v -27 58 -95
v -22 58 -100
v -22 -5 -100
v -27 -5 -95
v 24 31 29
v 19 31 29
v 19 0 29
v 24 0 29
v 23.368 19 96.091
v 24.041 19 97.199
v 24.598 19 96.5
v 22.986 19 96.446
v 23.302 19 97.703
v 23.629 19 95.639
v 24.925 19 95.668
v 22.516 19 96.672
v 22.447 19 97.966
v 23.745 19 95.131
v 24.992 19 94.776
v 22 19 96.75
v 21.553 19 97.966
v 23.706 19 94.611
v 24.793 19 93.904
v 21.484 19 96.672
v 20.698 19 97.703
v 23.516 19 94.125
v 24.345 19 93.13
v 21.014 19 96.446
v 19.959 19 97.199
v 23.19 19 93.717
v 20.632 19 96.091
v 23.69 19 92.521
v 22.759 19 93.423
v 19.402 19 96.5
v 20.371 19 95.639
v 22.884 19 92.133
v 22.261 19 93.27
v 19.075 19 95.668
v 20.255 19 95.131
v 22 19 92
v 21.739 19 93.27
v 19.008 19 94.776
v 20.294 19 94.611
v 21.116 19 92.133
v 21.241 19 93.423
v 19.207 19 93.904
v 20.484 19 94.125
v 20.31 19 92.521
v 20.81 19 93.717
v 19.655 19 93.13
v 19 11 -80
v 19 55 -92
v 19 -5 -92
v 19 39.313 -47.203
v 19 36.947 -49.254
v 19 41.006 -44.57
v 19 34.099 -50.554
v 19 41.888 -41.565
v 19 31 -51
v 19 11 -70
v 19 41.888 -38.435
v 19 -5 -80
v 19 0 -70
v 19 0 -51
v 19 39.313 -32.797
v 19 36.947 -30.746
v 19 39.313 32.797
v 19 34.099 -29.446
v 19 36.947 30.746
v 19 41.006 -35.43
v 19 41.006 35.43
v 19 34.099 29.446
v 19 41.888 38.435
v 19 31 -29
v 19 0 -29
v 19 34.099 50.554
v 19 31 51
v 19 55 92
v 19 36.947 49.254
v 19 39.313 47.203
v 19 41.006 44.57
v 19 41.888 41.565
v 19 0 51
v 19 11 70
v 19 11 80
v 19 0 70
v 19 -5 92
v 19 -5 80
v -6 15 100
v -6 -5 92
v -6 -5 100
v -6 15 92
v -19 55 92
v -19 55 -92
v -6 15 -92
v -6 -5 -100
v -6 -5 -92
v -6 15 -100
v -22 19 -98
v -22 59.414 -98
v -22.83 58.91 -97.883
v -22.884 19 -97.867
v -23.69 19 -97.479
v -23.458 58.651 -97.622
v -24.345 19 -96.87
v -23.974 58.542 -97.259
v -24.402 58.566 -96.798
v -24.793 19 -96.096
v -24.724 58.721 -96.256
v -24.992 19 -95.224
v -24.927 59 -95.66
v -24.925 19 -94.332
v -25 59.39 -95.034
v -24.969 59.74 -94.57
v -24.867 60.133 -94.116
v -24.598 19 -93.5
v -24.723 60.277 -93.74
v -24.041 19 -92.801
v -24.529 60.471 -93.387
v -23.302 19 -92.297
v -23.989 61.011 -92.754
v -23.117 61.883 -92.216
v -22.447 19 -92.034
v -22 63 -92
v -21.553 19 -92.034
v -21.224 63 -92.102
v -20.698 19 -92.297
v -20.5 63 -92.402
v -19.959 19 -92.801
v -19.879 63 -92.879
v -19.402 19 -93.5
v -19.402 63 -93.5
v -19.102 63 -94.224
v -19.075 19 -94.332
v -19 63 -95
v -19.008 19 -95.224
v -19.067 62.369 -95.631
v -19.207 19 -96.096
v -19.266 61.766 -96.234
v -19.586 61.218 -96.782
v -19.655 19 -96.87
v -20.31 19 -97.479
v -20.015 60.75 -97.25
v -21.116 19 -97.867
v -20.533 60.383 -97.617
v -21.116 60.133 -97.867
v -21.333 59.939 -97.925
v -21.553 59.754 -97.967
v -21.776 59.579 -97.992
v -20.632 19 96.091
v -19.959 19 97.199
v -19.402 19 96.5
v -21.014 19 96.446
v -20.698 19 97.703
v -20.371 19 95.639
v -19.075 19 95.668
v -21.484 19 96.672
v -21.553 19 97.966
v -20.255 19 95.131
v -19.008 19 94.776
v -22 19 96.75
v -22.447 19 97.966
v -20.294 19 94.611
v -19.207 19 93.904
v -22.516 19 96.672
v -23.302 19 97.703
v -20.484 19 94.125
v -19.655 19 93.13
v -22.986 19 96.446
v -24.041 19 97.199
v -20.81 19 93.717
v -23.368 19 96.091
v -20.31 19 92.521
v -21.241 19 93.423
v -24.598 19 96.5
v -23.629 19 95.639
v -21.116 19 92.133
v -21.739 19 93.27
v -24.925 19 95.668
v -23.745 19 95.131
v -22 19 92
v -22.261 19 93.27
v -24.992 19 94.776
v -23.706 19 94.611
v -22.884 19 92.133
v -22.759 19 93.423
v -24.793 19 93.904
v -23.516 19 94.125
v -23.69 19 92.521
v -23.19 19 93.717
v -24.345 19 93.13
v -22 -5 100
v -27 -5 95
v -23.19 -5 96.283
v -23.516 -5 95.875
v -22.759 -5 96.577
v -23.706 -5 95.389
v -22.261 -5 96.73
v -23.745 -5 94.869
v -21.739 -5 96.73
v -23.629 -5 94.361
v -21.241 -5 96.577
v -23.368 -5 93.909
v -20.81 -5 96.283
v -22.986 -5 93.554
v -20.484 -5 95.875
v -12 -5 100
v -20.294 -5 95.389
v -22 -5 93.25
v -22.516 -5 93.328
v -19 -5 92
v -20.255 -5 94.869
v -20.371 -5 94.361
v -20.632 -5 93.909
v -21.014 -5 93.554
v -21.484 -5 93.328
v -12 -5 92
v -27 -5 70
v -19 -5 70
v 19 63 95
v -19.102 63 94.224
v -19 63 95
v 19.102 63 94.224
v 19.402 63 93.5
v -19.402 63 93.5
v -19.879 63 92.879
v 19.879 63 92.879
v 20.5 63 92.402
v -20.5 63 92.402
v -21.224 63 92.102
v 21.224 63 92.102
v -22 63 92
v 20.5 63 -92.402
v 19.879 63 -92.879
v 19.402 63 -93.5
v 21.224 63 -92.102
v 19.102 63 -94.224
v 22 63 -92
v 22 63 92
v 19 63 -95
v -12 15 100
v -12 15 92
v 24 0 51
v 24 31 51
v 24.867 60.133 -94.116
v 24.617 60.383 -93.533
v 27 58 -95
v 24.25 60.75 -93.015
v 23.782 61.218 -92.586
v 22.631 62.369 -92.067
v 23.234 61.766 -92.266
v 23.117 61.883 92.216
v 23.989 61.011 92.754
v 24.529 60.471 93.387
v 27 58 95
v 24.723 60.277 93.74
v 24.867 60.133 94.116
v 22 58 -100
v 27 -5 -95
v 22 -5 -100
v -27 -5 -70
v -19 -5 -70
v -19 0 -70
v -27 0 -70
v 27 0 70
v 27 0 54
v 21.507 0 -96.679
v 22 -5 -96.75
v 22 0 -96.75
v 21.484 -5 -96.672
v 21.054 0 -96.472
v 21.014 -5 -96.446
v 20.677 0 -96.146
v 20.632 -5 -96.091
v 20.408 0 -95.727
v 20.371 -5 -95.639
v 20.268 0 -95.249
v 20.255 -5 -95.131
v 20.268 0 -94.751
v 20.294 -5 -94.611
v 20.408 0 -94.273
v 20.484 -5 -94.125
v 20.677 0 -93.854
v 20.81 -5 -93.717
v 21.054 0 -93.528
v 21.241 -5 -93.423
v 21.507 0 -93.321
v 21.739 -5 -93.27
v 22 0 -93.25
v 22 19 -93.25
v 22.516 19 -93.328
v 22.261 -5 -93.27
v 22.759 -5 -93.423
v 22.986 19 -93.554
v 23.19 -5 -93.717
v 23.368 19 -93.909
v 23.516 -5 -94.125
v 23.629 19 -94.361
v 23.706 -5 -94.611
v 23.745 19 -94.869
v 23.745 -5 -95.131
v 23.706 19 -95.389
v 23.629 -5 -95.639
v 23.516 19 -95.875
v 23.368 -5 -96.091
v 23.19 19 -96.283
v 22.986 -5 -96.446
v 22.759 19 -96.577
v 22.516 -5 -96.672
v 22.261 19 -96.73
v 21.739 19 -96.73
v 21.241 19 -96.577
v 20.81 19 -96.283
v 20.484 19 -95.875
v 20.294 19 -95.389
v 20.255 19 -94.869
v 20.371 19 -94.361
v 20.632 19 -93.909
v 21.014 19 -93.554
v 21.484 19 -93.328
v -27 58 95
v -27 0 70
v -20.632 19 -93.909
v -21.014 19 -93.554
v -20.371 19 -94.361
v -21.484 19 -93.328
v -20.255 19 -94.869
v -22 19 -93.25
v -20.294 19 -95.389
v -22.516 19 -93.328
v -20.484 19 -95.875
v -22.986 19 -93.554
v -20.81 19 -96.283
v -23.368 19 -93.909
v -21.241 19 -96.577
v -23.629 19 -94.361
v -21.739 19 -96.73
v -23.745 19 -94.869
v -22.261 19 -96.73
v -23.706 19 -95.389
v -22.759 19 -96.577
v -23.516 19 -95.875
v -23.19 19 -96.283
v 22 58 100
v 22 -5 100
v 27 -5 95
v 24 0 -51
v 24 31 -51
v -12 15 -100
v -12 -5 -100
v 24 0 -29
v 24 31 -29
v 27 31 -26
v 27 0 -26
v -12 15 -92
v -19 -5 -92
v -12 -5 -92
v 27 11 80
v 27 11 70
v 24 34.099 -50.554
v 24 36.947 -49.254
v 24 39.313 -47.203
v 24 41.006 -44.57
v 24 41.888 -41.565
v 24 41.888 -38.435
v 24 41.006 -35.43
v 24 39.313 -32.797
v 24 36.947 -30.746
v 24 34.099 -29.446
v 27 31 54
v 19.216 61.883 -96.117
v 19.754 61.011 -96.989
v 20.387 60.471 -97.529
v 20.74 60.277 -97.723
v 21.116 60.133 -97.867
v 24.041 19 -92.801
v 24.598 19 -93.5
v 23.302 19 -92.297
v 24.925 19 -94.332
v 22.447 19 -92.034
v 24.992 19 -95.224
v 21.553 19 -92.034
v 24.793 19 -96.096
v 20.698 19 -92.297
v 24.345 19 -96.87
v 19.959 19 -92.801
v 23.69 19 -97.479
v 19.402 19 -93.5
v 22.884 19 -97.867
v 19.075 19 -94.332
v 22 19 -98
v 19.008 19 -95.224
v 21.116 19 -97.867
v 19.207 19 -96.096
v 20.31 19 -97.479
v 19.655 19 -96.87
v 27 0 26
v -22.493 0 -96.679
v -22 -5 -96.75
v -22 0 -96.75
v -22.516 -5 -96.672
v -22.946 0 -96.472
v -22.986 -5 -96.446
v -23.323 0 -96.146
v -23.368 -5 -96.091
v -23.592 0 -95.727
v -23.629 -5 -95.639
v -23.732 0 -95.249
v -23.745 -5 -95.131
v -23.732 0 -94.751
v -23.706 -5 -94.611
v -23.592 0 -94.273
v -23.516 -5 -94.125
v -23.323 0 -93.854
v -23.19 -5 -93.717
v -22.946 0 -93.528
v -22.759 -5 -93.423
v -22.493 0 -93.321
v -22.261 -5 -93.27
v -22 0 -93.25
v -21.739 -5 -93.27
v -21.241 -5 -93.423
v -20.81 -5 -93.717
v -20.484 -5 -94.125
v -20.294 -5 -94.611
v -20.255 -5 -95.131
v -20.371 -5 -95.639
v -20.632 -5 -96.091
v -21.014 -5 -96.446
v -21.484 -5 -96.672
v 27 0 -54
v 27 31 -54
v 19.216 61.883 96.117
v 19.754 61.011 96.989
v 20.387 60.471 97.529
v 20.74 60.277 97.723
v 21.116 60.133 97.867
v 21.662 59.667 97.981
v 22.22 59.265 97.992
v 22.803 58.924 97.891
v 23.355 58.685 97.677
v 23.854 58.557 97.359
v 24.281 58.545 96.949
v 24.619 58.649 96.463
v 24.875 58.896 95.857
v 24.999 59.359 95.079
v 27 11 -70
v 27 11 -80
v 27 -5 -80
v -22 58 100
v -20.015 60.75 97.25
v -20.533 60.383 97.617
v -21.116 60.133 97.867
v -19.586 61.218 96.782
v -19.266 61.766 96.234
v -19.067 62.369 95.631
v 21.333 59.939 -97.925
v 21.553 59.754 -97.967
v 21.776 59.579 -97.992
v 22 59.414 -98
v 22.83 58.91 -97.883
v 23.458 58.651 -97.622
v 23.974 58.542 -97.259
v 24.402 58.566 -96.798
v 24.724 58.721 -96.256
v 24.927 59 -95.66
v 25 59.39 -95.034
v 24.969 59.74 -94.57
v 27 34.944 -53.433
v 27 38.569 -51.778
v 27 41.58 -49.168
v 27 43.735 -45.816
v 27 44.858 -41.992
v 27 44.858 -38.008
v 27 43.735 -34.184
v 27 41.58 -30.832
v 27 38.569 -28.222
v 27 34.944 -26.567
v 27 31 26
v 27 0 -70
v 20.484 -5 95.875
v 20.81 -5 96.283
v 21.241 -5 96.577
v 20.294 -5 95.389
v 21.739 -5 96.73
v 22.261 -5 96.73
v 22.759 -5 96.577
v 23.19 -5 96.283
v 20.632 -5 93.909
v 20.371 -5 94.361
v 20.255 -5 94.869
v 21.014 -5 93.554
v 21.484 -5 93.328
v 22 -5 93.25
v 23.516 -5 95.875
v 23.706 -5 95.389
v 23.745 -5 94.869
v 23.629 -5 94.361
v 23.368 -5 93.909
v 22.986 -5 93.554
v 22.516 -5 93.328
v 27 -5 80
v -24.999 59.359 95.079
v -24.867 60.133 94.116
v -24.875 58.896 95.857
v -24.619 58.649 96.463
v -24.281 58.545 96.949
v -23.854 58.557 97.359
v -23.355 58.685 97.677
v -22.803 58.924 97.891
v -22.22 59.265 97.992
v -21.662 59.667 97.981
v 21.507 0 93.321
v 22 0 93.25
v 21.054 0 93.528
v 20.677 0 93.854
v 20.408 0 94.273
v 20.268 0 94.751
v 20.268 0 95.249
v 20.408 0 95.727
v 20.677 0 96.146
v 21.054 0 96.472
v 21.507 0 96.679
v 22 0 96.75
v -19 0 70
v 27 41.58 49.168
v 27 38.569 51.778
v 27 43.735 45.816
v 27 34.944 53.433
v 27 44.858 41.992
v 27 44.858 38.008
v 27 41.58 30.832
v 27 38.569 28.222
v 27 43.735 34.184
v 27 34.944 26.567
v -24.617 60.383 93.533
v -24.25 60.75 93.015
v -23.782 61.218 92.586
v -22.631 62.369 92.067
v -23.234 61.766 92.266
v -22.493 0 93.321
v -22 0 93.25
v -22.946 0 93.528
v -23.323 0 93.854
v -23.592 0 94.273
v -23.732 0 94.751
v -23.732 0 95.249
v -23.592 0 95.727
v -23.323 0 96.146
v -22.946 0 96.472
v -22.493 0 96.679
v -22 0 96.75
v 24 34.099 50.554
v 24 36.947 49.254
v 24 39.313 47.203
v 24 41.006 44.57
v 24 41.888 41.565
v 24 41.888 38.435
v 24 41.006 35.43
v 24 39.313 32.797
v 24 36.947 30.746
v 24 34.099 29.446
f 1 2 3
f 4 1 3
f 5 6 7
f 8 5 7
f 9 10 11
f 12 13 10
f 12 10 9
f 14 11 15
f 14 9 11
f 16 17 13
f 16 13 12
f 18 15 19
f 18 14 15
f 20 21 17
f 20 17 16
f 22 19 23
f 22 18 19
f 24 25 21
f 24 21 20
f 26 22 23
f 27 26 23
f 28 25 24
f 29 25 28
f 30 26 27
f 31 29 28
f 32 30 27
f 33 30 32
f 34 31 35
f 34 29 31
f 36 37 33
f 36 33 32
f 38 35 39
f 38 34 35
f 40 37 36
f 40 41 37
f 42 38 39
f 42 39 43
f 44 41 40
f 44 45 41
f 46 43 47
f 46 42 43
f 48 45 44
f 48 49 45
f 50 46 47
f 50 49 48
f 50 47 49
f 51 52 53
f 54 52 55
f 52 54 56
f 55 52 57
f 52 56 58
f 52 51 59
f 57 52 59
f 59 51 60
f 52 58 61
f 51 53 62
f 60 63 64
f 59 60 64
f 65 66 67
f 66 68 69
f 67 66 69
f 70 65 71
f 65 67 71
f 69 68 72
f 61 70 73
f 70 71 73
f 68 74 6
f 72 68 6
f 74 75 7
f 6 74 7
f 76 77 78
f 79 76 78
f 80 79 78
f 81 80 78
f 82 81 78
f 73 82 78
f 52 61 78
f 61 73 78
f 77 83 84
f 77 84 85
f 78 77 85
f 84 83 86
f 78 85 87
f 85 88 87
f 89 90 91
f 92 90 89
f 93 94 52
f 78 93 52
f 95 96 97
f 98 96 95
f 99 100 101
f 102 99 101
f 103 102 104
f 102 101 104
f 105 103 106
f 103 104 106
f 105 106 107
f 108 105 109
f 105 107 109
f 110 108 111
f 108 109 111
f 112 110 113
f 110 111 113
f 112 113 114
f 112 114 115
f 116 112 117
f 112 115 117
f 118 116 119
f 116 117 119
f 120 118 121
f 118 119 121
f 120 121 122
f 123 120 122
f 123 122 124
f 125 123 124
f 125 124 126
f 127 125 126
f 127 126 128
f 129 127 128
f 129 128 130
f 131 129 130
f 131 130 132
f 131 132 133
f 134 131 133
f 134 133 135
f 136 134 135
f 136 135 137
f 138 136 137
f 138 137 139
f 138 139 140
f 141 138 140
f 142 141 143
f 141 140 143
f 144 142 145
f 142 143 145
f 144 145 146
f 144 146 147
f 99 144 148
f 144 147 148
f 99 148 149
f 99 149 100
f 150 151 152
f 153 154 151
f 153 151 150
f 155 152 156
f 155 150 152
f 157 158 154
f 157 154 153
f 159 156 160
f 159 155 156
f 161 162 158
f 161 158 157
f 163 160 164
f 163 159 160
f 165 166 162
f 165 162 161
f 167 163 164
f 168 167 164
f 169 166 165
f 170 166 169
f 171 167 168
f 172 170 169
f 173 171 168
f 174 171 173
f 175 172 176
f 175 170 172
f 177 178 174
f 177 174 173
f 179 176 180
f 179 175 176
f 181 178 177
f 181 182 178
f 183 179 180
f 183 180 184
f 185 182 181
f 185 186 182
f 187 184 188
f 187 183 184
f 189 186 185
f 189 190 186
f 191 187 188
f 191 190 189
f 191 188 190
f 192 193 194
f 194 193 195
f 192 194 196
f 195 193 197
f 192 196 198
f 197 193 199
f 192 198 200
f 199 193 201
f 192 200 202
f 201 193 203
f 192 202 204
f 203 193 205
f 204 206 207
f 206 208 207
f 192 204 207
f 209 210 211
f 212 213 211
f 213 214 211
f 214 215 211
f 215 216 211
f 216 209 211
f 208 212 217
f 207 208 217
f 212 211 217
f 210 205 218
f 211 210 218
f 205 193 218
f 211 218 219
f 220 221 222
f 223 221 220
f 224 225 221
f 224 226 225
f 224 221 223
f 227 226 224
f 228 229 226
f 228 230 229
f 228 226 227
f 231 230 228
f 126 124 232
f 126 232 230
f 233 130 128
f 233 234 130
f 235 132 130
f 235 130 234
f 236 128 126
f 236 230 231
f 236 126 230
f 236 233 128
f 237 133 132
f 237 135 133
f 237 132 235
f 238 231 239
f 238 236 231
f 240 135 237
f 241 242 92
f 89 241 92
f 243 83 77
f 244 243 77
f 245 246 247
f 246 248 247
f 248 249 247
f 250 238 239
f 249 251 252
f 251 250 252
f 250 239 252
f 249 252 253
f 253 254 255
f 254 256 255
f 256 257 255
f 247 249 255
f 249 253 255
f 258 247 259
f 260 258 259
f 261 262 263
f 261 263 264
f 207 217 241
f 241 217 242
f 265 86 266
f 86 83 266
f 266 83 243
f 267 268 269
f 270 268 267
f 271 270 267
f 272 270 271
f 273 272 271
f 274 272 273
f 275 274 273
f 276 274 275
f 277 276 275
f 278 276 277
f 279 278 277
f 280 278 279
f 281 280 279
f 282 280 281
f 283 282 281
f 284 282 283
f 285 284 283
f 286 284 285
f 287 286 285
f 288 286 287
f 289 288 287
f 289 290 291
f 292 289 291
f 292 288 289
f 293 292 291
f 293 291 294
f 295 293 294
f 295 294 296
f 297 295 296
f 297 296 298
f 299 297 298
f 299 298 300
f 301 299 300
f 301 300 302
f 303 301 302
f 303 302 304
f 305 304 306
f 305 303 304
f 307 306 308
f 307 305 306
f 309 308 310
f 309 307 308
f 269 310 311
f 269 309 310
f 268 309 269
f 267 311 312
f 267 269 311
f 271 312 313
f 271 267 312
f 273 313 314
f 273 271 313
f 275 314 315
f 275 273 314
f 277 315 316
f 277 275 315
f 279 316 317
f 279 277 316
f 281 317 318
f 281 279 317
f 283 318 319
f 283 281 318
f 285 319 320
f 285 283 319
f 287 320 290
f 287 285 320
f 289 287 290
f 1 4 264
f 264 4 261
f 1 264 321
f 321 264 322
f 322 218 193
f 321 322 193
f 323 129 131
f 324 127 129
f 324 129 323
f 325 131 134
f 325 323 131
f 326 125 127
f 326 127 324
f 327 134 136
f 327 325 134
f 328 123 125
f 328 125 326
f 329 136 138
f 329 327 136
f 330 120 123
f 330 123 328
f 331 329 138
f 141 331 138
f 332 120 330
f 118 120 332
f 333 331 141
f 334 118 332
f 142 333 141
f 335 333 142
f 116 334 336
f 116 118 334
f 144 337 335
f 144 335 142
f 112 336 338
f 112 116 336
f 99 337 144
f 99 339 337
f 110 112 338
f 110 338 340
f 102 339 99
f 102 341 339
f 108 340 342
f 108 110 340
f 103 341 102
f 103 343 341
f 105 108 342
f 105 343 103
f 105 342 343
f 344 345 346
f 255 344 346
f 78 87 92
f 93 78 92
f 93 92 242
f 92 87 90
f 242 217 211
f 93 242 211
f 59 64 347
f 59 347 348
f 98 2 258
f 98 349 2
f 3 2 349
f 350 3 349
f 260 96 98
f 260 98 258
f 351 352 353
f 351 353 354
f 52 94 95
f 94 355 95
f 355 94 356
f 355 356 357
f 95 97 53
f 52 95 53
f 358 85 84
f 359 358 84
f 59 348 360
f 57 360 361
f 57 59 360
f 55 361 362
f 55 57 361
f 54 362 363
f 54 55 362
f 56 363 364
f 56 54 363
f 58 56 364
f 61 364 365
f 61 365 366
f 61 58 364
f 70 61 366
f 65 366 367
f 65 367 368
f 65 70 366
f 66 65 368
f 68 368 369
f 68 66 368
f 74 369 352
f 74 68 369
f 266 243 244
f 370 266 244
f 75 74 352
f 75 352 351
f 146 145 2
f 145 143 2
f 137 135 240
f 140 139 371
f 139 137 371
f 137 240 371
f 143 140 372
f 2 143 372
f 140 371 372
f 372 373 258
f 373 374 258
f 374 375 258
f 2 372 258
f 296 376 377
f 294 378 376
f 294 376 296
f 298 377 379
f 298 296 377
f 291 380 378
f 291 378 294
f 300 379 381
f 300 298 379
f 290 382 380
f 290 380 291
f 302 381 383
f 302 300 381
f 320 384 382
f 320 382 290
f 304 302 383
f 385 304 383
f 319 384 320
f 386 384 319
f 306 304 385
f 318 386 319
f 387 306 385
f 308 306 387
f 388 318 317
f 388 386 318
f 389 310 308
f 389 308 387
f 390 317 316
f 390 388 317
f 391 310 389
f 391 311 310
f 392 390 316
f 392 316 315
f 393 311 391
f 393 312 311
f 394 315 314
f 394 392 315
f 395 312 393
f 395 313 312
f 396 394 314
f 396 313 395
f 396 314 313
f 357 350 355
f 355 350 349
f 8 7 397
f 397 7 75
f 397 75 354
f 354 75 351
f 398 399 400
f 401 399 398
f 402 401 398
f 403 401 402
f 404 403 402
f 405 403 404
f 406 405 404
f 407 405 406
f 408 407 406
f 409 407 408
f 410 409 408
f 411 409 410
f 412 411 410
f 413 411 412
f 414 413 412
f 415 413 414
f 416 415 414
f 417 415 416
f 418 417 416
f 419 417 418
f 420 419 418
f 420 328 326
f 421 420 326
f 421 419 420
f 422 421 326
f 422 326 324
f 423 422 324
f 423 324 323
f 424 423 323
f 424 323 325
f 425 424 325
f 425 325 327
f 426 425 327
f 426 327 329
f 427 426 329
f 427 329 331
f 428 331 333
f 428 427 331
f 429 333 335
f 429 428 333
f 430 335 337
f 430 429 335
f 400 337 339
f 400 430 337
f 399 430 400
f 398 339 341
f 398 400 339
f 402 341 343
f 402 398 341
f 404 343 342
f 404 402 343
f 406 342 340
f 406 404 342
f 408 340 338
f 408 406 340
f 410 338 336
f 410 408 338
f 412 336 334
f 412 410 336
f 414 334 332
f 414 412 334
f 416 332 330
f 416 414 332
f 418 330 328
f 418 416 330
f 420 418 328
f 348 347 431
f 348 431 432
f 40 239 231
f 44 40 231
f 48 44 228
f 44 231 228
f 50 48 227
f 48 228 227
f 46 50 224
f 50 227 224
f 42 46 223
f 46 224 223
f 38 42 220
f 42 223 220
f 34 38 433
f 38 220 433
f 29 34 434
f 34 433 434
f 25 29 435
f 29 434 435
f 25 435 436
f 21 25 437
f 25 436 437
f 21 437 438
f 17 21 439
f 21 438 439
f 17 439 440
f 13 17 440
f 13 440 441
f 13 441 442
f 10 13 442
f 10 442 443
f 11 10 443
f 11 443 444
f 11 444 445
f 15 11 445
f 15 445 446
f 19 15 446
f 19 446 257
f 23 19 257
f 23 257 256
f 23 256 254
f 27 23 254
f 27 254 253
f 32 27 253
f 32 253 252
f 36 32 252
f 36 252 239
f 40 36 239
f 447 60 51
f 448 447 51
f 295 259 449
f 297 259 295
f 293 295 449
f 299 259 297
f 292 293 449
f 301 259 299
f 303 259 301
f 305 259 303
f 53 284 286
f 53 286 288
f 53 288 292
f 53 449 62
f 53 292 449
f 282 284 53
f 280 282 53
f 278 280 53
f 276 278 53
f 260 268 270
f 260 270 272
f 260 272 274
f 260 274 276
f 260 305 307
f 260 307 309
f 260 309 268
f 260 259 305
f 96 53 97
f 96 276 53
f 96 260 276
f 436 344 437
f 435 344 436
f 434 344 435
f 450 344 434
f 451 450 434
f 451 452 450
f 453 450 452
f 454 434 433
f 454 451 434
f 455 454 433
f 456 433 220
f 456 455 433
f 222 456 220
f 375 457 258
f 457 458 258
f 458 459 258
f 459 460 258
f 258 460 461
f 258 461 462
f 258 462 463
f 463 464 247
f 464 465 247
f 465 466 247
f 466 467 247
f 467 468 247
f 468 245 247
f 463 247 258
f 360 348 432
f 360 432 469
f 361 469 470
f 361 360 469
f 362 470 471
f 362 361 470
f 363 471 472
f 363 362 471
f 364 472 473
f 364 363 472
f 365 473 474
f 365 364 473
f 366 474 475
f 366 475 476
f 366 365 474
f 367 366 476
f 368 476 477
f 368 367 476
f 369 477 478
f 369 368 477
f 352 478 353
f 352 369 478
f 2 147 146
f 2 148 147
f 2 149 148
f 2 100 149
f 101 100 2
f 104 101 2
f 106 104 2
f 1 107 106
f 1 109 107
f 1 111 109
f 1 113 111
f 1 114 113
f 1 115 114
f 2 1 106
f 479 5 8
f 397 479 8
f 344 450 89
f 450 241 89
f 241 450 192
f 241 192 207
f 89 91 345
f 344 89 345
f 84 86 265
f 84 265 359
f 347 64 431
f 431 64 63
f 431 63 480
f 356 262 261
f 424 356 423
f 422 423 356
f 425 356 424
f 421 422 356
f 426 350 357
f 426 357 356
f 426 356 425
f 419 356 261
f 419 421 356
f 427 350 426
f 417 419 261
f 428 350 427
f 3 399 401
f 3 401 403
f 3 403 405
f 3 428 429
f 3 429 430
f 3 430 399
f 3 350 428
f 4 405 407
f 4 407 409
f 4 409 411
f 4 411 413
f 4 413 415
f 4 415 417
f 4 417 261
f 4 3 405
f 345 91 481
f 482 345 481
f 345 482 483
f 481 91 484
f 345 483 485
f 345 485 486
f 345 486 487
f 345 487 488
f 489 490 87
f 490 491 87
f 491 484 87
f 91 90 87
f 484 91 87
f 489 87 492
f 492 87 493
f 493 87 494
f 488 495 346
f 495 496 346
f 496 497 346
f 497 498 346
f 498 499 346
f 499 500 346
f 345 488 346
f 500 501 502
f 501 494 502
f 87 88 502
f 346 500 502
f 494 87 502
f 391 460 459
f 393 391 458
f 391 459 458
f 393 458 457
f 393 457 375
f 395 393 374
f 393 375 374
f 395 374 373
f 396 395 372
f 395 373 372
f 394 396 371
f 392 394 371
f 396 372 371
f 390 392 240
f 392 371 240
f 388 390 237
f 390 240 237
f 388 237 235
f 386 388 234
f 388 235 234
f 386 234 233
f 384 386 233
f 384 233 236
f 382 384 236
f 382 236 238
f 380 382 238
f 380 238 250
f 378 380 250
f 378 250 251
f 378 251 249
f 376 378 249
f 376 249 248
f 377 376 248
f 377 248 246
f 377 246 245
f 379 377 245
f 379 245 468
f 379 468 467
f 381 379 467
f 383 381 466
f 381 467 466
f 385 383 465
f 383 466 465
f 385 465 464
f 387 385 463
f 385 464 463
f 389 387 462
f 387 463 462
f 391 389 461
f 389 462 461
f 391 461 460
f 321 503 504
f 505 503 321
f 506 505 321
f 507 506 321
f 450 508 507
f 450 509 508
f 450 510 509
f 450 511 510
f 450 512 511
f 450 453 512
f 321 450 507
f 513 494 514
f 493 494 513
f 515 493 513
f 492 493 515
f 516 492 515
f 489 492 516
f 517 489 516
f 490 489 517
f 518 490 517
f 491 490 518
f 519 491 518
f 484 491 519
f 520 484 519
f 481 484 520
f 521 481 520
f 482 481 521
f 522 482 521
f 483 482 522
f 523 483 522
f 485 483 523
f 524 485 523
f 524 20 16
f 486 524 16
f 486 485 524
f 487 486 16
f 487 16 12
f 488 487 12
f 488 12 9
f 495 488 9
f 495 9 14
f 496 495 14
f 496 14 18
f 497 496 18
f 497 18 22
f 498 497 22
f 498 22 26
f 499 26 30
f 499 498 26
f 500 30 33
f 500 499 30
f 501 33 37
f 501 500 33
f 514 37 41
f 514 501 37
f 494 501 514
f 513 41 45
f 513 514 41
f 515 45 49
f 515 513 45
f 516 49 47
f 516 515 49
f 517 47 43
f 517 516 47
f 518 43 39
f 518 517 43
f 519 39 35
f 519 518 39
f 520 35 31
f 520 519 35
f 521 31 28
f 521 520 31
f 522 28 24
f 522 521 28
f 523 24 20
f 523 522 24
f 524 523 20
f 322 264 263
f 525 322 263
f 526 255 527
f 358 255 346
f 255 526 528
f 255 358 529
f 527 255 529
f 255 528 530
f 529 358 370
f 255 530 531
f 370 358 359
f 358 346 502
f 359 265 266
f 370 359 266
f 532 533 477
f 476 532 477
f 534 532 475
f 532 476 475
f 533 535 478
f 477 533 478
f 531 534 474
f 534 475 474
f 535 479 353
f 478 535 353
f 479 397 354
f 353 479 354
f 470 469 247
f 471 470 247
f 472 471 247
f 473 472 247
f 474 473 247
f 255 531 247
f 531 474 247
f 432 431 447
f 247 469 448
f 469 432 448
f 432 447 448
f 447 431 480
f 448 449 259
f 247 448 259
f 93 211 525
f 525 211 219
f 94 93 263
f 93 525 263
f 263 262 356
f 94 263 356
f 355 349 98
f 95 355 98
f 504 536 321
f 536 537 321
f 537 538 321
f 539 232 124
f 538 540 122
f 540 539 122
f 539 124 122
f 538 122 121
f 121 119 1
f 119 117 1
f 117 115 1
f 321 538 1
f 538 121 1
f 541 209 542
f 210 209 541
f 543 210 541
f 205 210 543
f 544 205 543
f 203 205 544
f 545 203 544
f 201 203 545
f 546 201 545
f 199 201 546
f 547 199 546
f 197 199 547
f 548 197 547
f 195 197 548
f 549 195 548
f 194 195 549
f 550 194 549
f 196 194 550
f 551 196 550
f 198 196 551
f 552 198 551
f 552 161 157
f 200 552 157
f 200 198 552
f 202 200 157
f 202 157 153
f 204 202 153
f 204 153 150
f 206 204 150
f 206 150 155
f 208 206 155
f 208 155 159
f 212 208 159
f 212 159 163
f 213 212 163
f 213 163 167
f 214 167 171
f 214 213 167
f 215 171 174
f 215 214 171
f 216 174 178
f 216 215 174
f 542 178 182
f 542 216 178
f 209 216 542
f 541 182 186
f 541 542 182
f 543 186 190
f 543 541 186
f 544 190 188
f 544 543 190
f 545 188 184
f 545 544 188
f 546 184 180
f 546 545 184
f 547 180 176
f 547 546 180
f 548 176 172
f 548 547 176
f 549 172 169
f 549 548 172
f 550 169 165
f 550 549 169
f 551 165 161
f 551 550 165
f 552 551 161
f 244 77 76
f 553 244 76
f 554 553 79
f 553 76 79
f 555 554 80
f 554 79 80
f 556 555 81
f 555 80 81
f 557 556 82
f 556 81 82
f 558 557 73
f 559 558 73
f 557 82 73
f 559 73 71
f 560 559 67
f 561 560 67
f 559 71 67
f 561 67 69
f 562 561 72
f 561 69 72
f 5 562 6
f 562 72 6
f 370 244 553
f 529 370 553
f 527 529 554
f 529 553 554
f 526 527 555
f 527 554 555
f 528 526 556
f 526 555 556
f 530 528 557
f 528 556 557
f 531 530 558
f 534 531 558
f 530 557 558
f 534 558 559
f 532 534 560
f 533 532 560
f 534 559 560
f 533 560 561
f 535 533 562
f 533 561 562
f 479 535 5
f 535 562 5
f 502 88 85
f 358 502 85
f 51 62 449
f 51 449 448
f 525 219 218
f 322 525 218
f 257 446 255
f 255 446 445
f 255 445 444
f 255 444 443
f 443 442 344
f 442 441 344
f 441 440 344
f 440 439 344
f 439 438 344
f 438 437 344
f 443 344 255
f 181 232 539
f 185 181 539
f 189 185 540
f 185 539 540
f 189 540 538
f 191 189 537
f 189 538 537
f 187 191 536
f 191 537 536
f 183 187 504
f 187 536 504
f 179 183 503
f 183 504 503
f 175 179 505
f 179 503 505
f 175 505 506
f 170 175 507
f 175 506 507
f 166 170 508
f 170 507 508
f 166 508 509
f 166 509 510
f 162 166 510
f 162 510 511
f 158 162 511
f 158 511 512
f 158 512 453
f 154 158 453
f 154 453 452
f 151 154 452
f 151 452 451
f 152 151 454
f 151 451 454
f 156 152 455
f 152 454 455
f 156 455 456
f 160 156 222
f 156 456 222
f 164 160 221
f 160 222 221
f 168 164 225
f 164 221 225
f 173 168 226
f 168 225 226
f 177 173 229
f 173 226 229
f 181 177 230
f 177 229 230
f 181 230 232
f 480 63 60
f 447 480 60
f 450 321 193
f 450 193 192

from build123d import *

# Parameters (mm, degrees)
SKETCH2_W               = 54
SKETCH2_H               = 200
SKETCH2_W_2             = 38
SKETCH2_H_2             = 184
BOSS_EXTRUDE2_DEPTH     = 55
CUT_EXTRUDE1_DEPTH      = 118.277448813
BOSS_EXTRUDE3_START     = 55
SKETCH5_W               = 54
SKETCH5_H               = 200
BOSS_EXTRUDE3_DEPTH     = 8
CUT_EXTRUDE2_DEPTH      = 122.235308388
CUT_EXTRUDE2_DEPTH_BACK = 122.235308388
SKETCH6_R               = 1.75
CUT_EXTRUDE3_START      = 63
SKETCH7_R               = 3
CUT_EXTRUDE3_DEPTH      = 44
CHAMFER1_SIZE           = 5
CHAMFER3_SIZE           = 5
CHAMFER4_SIZE           = 3
BOSS_EXTRUDE4_START     = -5
SKETCH8_R               = 1.75
BOSS_EXTRUDE4_DEPTH     = 5
CUT_EXTRUDE4_DEPTH      = 122.235308388
CUT_EXTRUDE4_DEPTH_BACK = 122.235308388
SKETCH9_W               = 6
SKETCH9_H               = 20
SKETCH10_W              = 10
SKETCH10_H              = 16
CUT_EXTRUDE5_DEPTH      = 122.235308388


with BuildPart() as part:
    # Sketch2 → Boss-Extrude2 (new body)
    with BuildSketch(Plane(origin=(0, 0, 0), x_dir=(1, 0, 0), z_dir=(0, 1, 0))):
        Rectangle(SKETCH2_W, SKETCH2_H)
        Rectangle(SKETCH2_W_2, SKETCH2_H_2, mode=Mode.SUBTRACT)
    extrude(amount=BOSS_EXTRUDE2_DEPTH)

    # Sketch3 → Cut-Extrude1 (cut, through all)
    with BuildSketch(Plane(origin=(0, 0, 0), x_dir=(0, 0, -1), z_dir=(1, 0, 0))):
        with BuildLine():
            Line((-51, 0), (-51, 31))
            ThreePointArc((-51, 31), (-40, 42), (-29, 31))
            Line((-29, 31), (-29, 0))
            Line((-29, 0), (-51, 0))
        make_face()
        with BuildLine():
            Line((51, 0), (51, 31))
            ThreePointArc((51, 31), (40, 42), (29, 31))
            Line((29, 31), (29, 0))
            Line((29, 0), (51, 0))
        make_face()
    extrude(amount=CUT_EXTRUDE1_DEPTH, mode=Mode.SUBTRACT)

    # Sketch5 → Boss-Extrude3 (add)
    with BuildSketch(Plane(origin=(0, 0, 0), x_dir=(1, 0, 0), z_dir=(0, 1, 0)).offset(BOSS_EXTRUDE3_START)):
        Rectangle(SKETCH5_W, SKETCH5_H)
    extrude(amount=BOSS_EXTRUDE3_DEPTH)

    # Sketch6 → Cut-Extrude2 (cut, two sides: drawn at the far end of the back side and taken through both)
    with BuildSketch(Plane(origin=(0, 0, 0), x_dir=(1, 0, 0), z_dir=(0, 1, 0)).offset(-CUT_EXTRUDE2_DEPTH_BACK)):
        with Locations(Location((22, -95, 0), (0, 0, 270))):
            Circle(SKETCH6_R)
        with Locations(Location((-22, -95, 0), (0, 0, 270))):
            Circle(SKETCH6_R)
        with Locations(Location((-22, 95, 0), (0, 0, 270))):
            Circle(SKETCH6_R)
        with Locations(Location((22, 95, 0), (0, 0, 270))):
            Circle(SKETCH6_R)
    extrude(amount=CUT_EXTRUDE2_DEPTH + CUT_EXTRUDE2_DEPTH_BACK, mode=Mode.SUBTRACT)

    # Sketch7 → Cut-Extrude3 (cut)
    with BuildSketch(Plane(origin=(0, 0, 0), x_dir=(1, 0, 0), z_dir=(0, 1, 0)).offset(CUT_EXTRUDE3_START)):
        with Locations(Location((-22, -95, 0), (0, 0, 90))):
            Circle(SKETCH7_R)
        with Locations(Location((-22, 95, 0), (0, 0, 90))):
            Circle(SKETCH7_R)
        with Locations(Location((22, 95, 0), (0, 0, 90))):
            Circle(SKETCH7_R)
        with Locations(Location((22, -95, 0), (0, 0, 90))):
            Circle(SKETCH7_R)
    extrude(amount=-CUT_EXTRUDE3_DEPTH, mode=Mode.SUBTRACT)

    # Chamfer1
    chamfer1_edges = [part.edges().sort_by_distance(p)[0] for p in [
        (-27, 31.5, -100),
        (27, 31.5, -100),
        (27, 31.5, 100),
        (-27, 31.5, 100),
    ]]
    chamfer(chamfer1_edges, length=CHAMFER1_SIZE)

    # Chamfer3
    # the kernel refuses this chamfer: 5 mm, written as the material it takes off along each edge
    with BuildSketch(Plane(origin=(-34.85841494, 63, 100), x_dir=(0, -0.9996219169112968, 0.0274958766105877), z_dir=(1, 0, 0))) as chamfer3_piece_1:
        Polygon((CHAMFER3_SIZE * 0.999621916911, CHAMFER3_SIZE * 0.0274958766106), (-CHAMFER3_SIZE * 0.0274958766106, CHAMFER3_SIZE * 0.999621916911), (0, 0), align=None)
    extrude(amount=69.71682988, mode=Mode.SUBTRACT)
    with BuildSketch(Plane(origin=(-27, 63, -107.85841494), x_dir=(0.9996219169112968, 0.027495876610586317, 0), z_dir=(0, 0, 1)), Plane(origin=(27, 63, 107.85841494), x_dir=(-0.9996219169112968, 0.027495876610586317, 0), z_dir=(0, 0, -1))) as chamfer3_piece_2:
        Polygon((CHAMFER3_SIZE * 0.999621916911, -CHAMFER3_SIZE * 0.0274958766106), (-CHAMFER3_SIZE * 0.0274958766106, -CHAMFER3_SIZE * 0.999621916911), (0, 0), align=None)
    extrude(amount=215.71682988, mode=Mode.SUBTRACT)
    with BuildSketch(Plane(origin=(34.85841494, 63, -100), x_dir=(0, 0.027495876610586282, 0.9996219169112968), z_dir=(-1, 0, 0))) as chamfer3_piece_3:
        Polygon((CHAMFER3_SIZE * 0.999621916911, -CHAMFER3_SIZE * 0.0274958766106), (-CHAMFER3_SIZE * 0.0274958766106, -CHAMFER3_SIZE * 0.999621916911), (0, 0), align=None)
    extrude(amount=69.71682988, mode=Mode.SUBTRACT)
    with BuildSketch(Plane(origin=(12.907727601, 63, 109.092272399), x_dir=(-0.7068394360706735, 0.027495876610586337, -0.7068394360706735), z_dir=(0.7071067811865476, 0, -0.7071067811865476)), Plane(origin=(36.092272399, 63, -85.907727601), x_dir=(-0.7068394360706735, 0.027495876610586334, 0.7068394360706735), z_dir=(-0.7071067811865476, 0, -0.7071067811865476))) as chamfer3_piece_4:
        Polygon((CHAMFER3_SIZE * 0.999621916911, -CHAMFER3_SIZE * 0.0274958766106), (-CHAMFER3_SIZE * 0.0274958766106, -CHAMFER3_SIZE * 0.999621916911), (0, 0), align=None)
    extrude(amount=32.787897692, mode=Mode.SUBTRACT)
    with BuildSketch(Plane(origin=(-36.092272399, 63, -85.907727601), x_dir=(0.7068394360706735, 0.027495876610586334, 0.7068394360706735), z_dir=(0.7071067811865476, 0, -0.7071067811865476)), Plane(origin=(-12.907727601, 63, 109.092272399), x_dir=(0.7068394360706735, 0.027495876610586337, -0.7068394360706735), z_dir=(-0.7071067811865476, 0, -0.7071067811865476))) as chamfer3_piece_5:
        Polygon((CHAMFER3_SIZE * 0.999621916911, CHAMFER3_SIZE * 0.0274958766106), (-CHAMFER3_SIZE * 0.0274958766106, CHAMFER3_SIZE * 0.999621916911), (0, 0), align=None)
    extrude(amount=32.787897692, mode=Mode.SUBTRACT)

    # Chamfer4
    chamfer4_edges = [part.edges().sort_by_distance(p)[0] for p in [
        (27, 15.5, 29),
        (27, 42, 40),
        (27, 15.5, 51),
        (27, 15.5, -51),
        (27, 42, -40),
        (27, 15.5, -29),
    ]]
    chamfer(chamfer4_edges, length=CHAMFER4_SIZE)

    # Sketch8 → Boss-Extrude4 (add)
    # profile 1 of 2: a face of its own
    with BuildSketch(Plane(origin=(0, 0, 0), x_dir=(1, 0, 0), z_dir=(0, 1, 0)).offset(BOSS_EXTRUDE4_START)):
        Polygon((27, -70), (19, -70), (19, -92), (-19, -92), (-19, -70), (-27, -70), (-27, -95), (-22, -100), (22, -100), (27, -95), align=None)
        with Locations(Location((22, -95, 0), (0, 0, 90))):
            Circle(SKETCH8_R, mode=Mode.SUBTRACT)
        with Locations(Location((-22, -95, 0), (0, 0, 90))):
            Circle(SKETCH8_R, mode=Mode.SUBTRACT)
    # profile 2 of 2: a face of its own
    with BuildSketch(Plane(origin=(0, 0, 0), x_dir=(1, 0, 0), z_dir=(0, 1, 0)).offset(BOSS_EXTRUDE4_START)):
        Polygon((27, 95), (27, 70), (19, 70), (19, 92), (-19, 92), (-19, 70), (-27, 70), (-27, 95), (-22, 100), (22, 100), align=None)
        with Locations(Location((-22, 95, 0), (0, 0, 90))):
            Circle(SKETCH8_R, mode=Mode.SUBTRACT)
        with Locations(Location((22, 95, 0), (0, 0, 90))):
            Circle(SKETCH8_R, mode=Mode.SUBTRACT)
    extrude(amount=BOSS_EXTRUDE4_DEPTH)

    # Sketch9 → Cut-Extrude4 (cut, two sides: drawn at the far end of the back side and taken through both)
    with BuildSketch(Plane.XY.offset(-CUT_EXTRUDE4_DEPTH_BACK)):
        with Locations((-9, 5)):
            Rectangle(SKETCH9_W, SKETCH9_H)
    extrude(amount=CUT_EXTRUDE4_DEPTH + CUT_EXTRUDE4_DEPTH_BACK, mode=Mode.SUBTRACT)

    # Sketch10 → Cut-Extrude5 (cut, through all)
    with BuildSketch(Plane(origin=(0, 0, 0), x_dir=(0, 0, -1), z_dir=(1, 0, 0))):
        with Locations((-75, 3)):
            Rectangle(SKETCH10_W, SKETCH10_H)
        with Locations((75, 3)):
            Rectangle(SKETCH10_W, SKETCH10_H)
    extrude(amount=CUT_EXTRUDE5_DEPTH, mode=Mode.SUBTRACT)


solid = part.part
